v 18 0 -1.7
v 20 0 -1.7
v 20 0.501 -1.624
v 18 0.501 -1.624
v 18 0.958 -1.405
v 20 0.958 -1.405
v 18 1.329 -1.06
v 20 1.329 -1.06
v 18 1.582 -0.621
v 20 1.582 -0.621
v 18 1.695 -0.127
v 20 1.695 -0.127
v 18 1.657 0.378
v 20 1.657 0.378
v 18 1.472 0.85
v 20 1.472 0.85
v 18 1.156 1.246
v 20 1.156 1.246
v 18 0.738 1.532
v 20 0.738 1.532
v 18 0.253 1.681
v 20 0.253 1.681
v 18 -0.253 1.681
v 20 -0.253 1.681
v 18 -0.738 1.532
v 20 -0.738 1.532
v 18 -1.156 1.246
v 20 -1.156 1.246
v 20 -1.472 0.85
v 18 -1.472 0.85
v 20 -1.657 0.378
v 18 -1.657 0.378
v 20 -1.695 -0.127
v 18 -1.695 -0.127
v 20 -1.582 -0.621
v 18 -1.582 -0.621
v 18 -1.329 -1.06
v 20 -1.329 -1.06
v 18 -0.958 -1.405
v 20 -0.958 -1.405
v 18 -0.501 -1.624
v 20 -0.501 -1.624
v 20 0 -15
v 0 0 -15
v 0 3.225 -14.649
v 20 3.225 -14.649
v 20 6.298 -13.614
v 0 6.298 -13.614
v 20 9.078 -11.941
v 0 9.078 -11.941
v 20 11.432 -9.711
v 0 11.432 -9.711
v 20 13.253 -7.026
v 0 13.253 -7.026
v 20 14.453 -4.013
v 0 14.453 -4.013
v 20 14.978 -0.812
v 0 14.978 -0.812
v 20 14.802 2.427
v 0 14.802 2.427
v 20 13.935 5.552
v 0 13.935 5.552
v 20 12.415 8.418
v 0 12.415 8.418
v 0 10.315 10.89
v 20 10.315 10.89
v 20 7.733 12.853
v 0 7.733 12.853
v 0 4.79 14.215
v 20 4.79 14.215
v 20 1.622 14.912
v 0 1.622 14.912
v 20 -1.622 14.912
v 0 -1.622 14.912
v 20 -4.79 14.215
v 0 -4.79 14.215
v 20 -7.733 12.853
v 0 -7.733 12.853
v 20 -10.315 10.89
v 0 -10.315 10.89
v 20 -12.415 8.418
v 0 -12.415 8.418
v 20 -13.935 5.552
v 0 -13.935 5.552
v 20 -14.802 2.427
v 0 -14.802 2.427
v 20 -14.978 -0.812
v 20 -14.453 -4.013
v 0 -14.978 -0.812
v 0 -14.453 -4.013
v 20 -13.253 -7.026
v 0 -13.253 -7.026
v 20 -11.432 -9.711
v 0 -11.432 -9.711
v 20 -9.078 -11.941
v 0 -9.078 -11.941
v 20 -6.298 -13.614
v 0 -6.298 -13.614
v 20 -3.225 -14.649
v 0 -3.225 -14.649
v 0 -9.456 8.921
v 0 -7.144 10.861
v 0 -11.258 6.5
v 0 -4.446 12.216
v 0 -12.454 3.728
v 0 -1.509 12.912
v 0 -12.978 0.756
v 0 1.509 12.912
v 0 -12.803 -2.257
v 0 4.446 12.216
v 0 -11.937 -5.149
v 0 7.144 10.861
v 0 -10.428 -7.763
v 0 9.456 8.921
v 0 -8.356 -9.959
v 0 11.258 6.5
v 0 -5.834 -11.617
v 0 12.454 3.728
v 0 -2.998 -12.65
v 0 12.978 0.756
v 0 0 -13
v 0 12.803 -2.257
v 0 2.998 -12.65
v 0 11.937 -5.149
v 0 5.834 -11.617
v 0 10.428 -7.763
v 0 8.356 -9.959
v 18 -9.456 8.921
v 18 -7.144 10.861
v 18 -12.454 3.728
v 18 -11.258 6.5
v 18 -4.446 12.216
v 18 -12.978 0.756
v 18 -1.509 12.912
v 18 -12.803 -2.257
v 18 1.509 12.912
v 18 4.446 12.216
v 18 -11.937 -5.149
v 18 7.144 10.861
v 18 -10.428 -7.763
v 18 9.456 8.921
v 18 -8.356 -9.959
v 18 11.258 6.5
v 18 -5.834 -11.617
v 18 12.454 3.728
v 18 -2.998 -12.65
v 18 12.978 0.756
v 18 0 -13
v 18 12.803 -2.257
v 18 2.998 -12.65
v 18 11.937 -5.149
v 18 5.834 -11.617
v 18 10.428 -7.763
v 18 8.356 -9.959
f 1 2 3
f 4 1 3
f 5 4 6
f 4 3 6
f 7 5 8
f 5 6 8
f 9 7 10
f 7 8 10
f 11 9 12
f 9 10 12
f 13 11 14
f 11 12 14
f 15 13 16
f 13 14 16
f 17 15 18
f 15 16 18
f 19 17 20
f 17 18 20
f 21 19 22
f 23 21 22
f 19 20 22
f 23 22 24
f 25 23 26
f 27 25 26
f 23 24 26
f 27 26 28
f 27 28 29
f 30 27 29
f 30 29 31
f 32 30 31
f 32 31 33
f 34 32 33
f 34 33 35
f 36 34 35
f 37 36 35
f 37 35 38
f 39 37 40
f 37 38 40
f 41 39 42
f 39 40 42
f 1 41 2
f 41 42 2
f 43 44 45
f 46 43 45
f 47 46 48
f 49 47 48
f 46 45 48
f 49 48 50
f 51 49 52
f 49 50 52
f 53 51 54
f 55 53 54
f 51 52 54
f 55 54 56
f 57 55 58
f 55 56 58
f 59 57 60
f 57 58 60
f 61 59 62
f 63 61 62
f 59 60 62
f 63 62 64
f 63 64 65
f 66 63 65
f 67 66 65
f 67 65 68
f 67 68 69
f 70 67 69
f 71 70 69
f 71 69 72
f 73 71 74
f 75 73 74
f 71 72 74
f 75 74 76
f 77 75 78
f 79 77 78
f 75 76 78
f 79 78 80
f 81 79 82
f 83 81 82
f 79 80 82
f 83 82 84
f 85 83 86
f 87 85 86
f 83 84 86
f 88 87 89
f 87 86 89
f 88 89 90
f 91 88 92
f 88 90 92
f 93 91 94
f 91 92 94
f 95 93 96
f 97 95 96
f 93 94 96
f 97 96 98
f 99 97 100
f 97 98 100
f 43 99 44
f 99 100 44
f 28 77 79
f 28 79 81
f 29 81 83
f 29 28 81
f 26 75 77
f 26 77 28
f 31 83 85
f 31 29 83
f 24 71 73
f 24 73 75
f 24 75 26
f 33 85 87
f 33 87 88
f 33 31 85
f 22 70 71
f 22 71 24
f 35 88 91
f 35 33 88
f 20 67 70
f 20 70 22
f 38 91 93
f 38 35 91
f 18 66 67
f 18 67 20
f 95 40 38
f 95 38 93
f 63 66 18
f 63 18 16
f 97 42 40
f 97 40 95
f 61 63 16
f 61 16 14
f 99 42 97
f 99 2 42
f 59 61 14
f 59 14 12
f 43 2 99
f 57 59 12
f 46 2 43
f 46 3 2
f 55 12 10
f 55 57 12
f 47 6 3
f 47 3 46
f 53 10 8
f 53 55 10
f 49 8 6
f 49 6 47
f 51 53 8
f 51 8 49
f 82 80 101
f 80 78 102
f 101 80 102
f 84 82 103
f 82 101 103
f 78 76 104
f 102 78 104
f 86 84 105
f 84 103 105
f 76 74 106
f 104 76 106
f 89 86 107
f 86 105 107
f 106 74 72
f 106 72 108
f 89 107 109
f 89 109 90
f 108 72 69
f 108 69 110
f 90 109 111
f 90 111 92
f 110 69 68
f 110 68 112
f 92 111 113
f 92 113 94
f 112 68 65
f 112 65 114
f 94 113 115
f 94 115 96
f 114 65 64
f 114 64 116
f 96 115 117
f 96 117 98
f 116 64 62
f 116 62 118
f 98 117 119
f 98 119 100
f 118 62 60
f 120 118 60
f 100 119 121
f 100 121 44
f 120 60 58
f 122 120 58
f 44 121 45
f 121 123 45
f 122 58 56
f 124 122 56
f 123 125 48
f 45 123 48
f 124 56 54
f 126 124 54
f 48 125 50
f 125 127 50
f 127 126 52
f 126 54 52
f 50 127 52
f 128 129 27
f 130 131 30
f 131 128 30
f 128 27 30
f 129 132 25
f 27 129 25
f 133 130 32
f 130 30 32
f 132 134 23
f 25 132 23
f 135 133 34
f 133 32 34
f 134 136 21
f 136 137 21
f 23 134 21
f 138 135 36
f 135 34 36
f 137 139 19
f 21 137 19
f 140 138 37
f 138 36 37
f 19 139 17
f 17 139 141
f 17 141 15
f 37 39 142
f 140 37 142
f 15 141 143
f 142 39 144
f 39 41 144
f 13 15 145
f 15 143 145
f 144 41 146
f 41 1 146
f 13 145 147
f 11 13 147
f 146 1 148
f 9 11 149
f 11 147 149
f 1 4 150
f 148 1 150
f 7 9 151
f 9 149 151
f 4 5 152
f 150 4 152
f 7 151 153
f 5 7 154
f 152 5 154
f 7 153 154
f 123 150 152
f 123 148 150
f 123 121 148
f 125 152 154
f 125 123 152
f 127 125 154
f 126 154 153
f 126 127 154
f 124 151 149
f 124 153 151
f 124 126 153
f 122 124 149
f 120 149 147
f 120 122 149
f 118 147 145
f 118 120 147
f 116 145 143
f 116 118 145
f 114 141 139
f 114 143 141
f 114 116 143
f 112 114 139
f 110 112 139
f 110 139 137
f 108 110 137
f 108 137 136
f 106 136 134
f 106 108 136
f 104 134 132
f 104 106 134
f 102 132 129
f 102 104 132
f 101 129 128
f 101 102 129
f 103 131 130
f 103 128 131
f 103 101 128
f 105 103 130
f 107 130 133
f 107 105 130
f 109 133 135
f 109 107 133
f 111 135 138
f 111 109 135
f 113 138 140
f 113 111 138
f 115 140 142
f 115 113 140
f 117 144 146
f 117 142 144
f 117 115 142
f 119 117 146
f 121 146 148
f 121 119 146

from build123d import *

# Parameters (mm, degrees)
SKETCH1_R           = 15
BOSS_EXTRUDE3_DEPTH = 20
SHELL2_T            = -2
SKETCH2_R           = 1.7
CUT_EXTRUDE1_DEPTH  = 2


with BuildPart() as part:
    # Sketch1 → Boss-Extrude3 (new body)
    with BuildSketch(Plane(origin=(0, 0, 0), x_dir=(0, 0, -1), z_dir=(1, 0, 0))):
        Circle(SKETCH1_R)
    extrude(amount=BOSS_EXTRUDE3_DEPTH)

    # Shell2
    shell2_openings = [part.faces().sort_by_distance(p)[0] for p in [
        (0, 0, 0),
    ]]
    offset(amount=SHELL2_T, openings=shell2_openings, kind=Kind.INTERSECTION)

    # Sketch2 → Cut-Extrude1 (cut)
    with BuildSketch(Plane(origin=(20, 0, 0), x_dir=(0, 0, -1), z_dir=(1, 0, 0))):
        Circle(SKETCH2_R)
    extrude(amount=-CUT_EXTRUDE1_DEPTH, mode=Mode.SUBTRACT)


solid = part.part
